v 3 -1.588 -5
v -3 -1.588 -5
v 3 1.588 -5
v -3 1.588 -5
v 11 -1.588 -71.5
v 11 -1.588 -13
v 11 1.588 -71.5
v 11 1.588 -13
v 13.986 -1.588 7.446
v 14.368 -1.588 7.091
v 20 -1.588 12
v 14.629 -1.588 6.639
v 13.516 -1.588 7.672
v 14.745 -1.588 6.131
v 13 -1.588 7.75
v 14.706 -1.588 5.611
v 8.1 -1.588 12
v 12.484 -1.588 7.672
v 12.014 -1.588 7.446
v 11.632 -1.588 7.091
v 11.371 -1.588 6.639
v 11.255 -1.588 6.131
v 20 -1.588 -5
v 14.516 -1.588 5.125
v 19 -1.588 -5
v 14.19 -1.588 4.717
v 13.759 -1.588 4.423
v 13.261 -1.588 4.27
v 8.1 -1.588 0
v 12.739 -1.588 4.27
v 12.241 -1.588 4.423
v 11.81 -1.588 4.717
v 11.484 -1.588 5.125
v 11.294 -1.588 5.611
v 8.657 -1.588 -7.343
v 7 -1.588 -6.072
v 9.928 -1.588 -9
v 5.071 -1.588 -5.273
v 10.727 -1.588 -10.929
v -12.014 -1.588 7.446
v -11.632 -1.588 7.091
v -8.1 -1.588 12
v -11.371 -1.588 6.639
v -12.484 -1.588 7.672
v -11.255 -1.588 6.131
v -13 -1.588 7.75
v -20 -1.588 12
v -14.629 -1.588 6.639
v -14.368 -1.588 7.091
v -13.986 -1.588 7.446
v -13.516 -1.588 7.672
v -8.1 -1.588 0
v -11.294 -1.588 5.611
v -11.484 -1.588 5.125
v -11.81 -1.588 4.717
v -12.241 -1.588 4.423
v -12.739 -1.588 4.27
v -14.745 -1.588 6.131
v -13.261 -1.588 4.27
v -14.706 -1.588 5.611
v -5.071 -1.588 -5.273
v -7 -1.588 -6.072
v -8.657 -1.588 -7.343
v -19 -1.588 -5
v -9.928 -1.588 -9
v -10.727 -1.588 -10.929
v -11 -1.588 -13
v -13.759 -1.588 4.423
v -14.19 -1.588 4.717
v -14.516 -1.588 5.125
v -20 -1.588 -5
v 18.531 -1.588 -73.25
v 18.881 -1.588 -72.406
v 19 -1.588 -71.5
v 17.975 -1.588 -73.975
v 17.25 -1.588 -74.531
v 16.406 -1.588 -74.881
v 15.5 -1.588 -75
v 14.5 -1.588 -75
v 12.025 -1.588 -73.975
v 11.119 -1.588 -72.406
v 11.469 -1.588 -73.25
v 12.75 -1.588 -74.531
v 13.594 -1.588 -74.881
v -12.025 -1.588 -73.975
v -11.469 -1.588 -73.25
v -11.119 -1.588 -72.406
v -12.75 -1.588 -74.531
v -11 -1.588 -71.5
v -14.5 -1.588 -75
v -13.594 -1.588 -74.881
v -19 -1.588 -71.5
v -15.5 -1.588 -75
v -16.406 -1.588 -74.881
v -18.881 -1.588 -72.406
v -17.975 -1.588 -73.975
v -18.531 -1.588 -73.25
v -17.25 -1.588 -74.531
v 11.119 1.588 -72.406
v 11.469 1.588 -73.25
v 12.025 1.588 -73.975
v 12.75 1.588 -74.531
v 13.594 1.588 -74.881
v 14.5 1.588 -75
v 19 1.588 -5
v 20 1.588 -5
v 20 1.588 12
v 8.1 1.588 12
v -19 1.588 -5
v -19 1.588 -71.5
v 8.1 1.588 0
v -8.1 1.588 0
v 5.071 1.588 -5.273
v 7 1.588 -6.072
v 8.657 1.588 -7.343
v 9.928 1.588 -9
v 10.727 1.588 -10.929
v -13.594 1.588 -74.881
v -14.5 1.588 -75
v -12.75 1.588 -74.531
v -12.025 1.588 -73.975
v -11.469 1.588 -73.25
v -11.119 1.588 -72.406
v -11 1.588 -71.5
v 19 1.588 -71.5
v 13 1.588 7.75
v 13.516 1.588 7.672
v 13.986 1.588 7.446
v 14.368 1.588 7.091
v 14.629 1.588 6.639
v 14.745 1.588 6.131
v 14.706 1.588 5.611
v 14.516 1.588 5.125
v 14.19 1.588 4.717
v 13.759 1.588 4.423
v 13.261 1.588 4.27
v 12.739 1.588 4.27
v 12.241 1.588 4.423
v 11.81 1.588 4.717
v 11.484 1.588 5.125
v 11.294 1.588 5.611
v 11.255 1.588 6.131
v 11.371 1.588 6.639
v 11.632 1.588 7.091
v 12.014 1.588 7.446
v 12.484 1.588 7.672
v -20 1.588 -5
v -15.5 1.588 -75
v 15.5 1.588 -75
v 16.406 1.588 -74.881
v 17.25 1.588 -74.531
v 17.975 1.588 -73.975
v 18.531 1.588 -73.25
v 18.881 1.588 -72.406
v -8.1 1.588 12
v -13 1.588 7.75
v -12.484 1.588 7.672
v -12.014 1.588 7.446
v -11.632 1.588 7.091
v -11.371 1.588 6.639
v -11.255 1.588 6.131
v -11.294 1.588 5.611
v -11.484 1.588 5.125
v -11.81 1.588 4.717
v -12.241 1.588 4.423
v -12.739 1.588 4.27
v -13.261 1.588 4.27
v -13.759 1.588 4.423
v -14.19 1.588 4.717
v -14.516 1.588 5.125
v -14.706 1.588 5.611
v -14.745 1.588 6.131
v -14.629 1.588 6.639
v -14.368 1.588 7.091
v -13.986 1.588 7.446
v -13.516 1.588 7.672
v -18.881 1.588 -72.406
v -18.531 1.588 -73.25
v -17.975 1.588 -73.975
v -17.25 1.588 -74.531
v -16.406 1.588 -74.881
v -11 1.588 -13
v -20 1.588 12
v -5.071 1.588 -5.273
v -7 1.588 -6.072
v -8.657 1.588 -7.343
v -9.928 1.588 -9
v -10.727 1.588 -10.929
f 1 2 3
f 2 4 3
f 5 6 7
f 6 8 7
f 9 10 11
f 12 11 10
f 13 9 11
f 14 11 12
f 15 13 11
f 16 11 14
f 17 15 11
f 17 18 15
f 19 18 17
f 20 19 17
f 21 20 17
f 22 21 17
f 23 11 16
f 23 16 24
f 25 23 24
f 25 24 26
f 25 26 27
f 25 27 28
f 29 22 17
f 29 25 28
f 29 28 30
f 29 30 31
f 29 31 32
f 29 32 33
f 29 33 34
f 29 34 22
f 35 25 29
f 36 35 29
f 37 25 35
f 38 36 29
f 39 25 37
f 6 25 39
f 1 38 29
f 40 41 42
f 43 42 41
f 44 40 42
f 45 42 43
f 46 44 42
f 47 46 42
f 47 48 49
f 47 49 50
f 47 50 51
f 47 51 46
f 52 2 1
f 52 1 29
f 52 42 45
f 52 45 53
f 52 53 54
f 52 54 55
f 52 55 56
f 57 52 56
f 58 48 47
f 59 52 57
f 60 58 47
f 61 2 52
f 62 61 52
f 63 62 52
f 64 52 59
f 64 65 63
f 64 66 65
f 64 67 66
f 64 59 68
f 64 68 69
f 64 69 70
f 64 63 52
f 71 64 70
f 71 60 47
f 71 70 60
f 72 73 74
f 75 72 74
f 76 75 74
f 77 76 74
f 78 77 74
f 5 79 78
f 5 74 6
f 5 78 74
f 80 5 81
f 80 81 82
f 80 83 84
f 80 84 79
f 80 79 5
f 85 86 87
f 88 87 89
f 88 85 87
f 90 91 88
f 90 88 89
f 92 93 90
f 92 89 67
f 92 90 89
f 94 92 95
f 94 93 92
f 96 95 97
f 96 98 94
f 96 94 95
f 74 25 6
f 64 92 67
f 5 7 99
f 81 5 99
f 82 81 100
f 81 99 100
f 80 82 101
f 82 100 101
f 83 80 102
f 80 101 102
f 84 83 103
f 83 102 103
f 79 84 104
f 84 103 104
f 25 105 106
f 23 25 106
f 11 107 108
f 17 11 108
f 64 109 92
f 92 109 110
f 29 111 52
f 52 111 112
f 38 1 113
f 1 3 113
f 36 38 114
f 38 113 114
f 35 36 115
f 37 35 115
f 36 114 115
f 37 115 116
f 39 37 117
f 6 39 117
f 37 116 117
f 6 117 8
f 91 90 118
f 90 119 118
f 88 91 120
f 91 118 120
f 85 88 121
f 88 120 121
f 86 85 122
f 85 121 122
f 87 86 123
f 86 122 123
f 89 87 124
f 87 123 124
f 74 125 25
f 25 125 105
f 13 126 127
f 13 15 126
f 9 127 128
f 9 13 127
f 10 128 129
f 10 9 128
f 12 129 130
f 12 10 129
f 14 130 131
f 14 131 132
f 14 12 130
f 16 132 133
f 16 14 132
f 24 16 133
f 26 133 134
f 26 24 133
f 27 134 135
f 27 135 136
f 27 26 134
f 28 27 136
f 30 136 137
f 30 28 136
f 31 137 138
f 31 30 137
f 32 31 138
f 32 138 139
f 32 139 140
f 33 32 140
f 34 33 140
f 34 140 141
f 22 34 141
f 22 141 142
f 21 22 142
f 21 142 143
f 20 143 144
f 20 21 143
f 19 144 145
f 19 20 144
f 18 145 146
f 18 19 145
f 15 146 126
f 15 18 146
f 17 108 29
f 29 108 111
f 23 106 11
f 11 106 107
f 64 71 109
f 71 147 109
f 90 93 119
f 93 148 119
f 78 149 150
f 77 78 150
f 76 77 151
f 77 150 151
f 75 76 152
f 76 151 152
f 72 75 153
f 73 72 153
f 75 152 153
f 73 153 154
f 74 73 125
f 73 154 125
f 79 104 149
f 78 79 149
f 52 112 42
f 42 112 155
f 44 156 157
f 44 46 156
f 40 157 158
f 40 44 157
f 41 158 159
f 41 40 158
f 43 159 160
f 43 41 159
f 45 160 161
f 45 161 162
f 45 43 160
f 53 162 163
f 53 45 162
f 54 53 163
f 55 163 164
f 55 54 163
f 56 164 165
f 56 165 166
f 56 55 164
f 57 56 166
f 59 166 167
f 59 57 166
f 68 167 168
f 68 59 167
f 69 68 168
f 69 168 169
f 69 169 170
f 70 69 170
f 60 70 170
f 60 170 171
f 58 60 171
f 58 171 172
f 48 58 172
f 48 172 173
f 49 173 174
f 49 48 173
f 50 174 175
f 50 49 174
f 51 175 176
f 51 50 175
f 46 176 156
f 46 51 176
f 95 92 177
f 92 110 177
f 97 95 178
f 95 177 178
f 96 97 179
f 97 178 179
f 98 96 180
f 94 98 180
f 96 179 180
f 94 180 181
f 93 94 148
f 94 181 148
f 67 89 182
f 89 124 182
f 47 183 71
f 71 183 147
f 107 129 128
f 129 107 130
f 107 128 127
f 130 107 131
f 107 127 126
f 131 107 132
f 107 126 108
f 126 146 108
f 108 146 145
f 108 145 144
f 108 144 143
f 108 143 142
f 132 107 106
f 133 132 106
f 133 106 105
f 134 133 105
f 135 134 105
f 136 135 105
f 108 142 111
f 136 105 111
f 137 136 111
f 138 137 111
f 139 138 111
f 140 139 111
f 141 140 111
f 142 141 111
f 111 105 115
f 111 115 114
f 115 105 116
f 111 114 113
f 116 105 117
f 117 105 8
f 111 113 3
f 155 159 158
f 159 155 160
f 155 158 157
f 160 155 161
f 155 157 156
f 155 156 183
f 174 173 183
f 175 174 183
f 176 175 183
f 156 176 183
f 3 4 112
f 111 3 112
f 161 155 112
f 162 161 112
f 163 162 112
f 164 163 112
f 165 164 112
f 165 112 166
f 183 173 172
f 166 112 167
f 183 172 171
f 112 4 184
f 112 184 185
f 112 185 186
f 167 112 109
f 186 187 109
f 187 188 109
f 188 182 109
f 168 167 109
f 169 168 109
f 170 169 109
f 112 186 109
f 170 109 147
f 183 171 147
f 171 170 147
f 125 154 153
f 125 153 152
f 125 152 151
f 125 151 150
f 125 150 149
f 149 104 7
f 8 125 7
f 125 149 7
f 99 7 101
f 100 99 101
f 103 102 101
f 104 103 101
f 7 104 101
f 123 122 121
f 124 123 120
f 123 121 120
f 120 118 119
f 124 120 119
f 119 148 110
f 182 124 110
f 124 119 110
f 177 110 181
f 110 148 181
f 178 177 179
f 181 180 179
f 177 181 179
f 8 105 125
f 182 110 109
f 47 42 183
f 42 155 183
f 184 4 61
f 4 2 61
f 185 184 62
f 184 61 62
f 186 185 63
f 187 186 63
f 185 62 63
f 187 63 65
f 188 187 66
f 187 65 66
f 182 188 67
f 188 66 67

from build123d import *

# Parameters (mm, degrees)
CROQUIS1_R              = 1.75
SALIENTE_EXTRUIR1_DEPTH = 1.5875
REDONDEO1_R             = 8


with BuildPart() as part:
    # Croquis1 → Saliente-Extruir1 (new, symmetric)
    with BuildSketch(Plane(origin=(0, 0, 0), x_dir=(1, 0, 0), z_dir=(0, 1, 0))):
        with BuildLine():
            Line((8.1, 0), (-8.1, 0))
            Line((-8.1, 0), (-8.1, -12))
            Line((-8.1, -12), (-20, -12))
            Line((-20, -12), (-20, 5))
            Line((-20, 5), (-19, 5))
            Line((-19, 5), (-19, 71.5))
            ThreePointArc((-19, 71.5), (-17.974873734, 73.974873734), (-15.5, 75))
            Line((-15.5, 75), (-14.5, 75))
            ThreePointArc((-14.5, 75), (-12.025126266, 73.974873734), (-11, 71.5))
            Line((-11, 71.5), (-11, 5))
            Line((-11, 5), (11, 5))
            Line((11, 5), (11, 71.5))
            ThreePointArc((11, 71.5), (12.025126266, 73.974873734), (14.5, 75))
            Line((14.5, 75), (15.5, 75))
            ThreePointArc((15.5, 75), (17.974873734, 73.974873734), (19, 71.5))
            Line((19, 71.5), (19, 5))
            Line((19, 5), (20, 5))
            Line((20, 5), (20, -12))
            Line((20, -12), (8.1, -12))
            Line((8.1, -12), (8.1, 0))
        make_face()
        with Locations(Location((-13, -6, 0), (0, 0, 270))):
            Circle(CROQUIS1_R, mode=Mode.SUBTRACT)
        with Locations(Location((13, -6, 0), (0, 0, 270))):
            Circle(CROQUIS1_R, mode=Mode.SUBTRACT)
    extrude(amount=SALIENTE_EXTRUIR1_DEPTH, both=True)

    # Redondeo1
    redondeo1_edges = [part.edges().sort_by_distance(p)[0] for p in [
        (-11, 0, -5),
        (11, 0, -5),
    ]]
    fillet(redondeo1_edges, radius=REDONDEO1_R)


solid = part.part
